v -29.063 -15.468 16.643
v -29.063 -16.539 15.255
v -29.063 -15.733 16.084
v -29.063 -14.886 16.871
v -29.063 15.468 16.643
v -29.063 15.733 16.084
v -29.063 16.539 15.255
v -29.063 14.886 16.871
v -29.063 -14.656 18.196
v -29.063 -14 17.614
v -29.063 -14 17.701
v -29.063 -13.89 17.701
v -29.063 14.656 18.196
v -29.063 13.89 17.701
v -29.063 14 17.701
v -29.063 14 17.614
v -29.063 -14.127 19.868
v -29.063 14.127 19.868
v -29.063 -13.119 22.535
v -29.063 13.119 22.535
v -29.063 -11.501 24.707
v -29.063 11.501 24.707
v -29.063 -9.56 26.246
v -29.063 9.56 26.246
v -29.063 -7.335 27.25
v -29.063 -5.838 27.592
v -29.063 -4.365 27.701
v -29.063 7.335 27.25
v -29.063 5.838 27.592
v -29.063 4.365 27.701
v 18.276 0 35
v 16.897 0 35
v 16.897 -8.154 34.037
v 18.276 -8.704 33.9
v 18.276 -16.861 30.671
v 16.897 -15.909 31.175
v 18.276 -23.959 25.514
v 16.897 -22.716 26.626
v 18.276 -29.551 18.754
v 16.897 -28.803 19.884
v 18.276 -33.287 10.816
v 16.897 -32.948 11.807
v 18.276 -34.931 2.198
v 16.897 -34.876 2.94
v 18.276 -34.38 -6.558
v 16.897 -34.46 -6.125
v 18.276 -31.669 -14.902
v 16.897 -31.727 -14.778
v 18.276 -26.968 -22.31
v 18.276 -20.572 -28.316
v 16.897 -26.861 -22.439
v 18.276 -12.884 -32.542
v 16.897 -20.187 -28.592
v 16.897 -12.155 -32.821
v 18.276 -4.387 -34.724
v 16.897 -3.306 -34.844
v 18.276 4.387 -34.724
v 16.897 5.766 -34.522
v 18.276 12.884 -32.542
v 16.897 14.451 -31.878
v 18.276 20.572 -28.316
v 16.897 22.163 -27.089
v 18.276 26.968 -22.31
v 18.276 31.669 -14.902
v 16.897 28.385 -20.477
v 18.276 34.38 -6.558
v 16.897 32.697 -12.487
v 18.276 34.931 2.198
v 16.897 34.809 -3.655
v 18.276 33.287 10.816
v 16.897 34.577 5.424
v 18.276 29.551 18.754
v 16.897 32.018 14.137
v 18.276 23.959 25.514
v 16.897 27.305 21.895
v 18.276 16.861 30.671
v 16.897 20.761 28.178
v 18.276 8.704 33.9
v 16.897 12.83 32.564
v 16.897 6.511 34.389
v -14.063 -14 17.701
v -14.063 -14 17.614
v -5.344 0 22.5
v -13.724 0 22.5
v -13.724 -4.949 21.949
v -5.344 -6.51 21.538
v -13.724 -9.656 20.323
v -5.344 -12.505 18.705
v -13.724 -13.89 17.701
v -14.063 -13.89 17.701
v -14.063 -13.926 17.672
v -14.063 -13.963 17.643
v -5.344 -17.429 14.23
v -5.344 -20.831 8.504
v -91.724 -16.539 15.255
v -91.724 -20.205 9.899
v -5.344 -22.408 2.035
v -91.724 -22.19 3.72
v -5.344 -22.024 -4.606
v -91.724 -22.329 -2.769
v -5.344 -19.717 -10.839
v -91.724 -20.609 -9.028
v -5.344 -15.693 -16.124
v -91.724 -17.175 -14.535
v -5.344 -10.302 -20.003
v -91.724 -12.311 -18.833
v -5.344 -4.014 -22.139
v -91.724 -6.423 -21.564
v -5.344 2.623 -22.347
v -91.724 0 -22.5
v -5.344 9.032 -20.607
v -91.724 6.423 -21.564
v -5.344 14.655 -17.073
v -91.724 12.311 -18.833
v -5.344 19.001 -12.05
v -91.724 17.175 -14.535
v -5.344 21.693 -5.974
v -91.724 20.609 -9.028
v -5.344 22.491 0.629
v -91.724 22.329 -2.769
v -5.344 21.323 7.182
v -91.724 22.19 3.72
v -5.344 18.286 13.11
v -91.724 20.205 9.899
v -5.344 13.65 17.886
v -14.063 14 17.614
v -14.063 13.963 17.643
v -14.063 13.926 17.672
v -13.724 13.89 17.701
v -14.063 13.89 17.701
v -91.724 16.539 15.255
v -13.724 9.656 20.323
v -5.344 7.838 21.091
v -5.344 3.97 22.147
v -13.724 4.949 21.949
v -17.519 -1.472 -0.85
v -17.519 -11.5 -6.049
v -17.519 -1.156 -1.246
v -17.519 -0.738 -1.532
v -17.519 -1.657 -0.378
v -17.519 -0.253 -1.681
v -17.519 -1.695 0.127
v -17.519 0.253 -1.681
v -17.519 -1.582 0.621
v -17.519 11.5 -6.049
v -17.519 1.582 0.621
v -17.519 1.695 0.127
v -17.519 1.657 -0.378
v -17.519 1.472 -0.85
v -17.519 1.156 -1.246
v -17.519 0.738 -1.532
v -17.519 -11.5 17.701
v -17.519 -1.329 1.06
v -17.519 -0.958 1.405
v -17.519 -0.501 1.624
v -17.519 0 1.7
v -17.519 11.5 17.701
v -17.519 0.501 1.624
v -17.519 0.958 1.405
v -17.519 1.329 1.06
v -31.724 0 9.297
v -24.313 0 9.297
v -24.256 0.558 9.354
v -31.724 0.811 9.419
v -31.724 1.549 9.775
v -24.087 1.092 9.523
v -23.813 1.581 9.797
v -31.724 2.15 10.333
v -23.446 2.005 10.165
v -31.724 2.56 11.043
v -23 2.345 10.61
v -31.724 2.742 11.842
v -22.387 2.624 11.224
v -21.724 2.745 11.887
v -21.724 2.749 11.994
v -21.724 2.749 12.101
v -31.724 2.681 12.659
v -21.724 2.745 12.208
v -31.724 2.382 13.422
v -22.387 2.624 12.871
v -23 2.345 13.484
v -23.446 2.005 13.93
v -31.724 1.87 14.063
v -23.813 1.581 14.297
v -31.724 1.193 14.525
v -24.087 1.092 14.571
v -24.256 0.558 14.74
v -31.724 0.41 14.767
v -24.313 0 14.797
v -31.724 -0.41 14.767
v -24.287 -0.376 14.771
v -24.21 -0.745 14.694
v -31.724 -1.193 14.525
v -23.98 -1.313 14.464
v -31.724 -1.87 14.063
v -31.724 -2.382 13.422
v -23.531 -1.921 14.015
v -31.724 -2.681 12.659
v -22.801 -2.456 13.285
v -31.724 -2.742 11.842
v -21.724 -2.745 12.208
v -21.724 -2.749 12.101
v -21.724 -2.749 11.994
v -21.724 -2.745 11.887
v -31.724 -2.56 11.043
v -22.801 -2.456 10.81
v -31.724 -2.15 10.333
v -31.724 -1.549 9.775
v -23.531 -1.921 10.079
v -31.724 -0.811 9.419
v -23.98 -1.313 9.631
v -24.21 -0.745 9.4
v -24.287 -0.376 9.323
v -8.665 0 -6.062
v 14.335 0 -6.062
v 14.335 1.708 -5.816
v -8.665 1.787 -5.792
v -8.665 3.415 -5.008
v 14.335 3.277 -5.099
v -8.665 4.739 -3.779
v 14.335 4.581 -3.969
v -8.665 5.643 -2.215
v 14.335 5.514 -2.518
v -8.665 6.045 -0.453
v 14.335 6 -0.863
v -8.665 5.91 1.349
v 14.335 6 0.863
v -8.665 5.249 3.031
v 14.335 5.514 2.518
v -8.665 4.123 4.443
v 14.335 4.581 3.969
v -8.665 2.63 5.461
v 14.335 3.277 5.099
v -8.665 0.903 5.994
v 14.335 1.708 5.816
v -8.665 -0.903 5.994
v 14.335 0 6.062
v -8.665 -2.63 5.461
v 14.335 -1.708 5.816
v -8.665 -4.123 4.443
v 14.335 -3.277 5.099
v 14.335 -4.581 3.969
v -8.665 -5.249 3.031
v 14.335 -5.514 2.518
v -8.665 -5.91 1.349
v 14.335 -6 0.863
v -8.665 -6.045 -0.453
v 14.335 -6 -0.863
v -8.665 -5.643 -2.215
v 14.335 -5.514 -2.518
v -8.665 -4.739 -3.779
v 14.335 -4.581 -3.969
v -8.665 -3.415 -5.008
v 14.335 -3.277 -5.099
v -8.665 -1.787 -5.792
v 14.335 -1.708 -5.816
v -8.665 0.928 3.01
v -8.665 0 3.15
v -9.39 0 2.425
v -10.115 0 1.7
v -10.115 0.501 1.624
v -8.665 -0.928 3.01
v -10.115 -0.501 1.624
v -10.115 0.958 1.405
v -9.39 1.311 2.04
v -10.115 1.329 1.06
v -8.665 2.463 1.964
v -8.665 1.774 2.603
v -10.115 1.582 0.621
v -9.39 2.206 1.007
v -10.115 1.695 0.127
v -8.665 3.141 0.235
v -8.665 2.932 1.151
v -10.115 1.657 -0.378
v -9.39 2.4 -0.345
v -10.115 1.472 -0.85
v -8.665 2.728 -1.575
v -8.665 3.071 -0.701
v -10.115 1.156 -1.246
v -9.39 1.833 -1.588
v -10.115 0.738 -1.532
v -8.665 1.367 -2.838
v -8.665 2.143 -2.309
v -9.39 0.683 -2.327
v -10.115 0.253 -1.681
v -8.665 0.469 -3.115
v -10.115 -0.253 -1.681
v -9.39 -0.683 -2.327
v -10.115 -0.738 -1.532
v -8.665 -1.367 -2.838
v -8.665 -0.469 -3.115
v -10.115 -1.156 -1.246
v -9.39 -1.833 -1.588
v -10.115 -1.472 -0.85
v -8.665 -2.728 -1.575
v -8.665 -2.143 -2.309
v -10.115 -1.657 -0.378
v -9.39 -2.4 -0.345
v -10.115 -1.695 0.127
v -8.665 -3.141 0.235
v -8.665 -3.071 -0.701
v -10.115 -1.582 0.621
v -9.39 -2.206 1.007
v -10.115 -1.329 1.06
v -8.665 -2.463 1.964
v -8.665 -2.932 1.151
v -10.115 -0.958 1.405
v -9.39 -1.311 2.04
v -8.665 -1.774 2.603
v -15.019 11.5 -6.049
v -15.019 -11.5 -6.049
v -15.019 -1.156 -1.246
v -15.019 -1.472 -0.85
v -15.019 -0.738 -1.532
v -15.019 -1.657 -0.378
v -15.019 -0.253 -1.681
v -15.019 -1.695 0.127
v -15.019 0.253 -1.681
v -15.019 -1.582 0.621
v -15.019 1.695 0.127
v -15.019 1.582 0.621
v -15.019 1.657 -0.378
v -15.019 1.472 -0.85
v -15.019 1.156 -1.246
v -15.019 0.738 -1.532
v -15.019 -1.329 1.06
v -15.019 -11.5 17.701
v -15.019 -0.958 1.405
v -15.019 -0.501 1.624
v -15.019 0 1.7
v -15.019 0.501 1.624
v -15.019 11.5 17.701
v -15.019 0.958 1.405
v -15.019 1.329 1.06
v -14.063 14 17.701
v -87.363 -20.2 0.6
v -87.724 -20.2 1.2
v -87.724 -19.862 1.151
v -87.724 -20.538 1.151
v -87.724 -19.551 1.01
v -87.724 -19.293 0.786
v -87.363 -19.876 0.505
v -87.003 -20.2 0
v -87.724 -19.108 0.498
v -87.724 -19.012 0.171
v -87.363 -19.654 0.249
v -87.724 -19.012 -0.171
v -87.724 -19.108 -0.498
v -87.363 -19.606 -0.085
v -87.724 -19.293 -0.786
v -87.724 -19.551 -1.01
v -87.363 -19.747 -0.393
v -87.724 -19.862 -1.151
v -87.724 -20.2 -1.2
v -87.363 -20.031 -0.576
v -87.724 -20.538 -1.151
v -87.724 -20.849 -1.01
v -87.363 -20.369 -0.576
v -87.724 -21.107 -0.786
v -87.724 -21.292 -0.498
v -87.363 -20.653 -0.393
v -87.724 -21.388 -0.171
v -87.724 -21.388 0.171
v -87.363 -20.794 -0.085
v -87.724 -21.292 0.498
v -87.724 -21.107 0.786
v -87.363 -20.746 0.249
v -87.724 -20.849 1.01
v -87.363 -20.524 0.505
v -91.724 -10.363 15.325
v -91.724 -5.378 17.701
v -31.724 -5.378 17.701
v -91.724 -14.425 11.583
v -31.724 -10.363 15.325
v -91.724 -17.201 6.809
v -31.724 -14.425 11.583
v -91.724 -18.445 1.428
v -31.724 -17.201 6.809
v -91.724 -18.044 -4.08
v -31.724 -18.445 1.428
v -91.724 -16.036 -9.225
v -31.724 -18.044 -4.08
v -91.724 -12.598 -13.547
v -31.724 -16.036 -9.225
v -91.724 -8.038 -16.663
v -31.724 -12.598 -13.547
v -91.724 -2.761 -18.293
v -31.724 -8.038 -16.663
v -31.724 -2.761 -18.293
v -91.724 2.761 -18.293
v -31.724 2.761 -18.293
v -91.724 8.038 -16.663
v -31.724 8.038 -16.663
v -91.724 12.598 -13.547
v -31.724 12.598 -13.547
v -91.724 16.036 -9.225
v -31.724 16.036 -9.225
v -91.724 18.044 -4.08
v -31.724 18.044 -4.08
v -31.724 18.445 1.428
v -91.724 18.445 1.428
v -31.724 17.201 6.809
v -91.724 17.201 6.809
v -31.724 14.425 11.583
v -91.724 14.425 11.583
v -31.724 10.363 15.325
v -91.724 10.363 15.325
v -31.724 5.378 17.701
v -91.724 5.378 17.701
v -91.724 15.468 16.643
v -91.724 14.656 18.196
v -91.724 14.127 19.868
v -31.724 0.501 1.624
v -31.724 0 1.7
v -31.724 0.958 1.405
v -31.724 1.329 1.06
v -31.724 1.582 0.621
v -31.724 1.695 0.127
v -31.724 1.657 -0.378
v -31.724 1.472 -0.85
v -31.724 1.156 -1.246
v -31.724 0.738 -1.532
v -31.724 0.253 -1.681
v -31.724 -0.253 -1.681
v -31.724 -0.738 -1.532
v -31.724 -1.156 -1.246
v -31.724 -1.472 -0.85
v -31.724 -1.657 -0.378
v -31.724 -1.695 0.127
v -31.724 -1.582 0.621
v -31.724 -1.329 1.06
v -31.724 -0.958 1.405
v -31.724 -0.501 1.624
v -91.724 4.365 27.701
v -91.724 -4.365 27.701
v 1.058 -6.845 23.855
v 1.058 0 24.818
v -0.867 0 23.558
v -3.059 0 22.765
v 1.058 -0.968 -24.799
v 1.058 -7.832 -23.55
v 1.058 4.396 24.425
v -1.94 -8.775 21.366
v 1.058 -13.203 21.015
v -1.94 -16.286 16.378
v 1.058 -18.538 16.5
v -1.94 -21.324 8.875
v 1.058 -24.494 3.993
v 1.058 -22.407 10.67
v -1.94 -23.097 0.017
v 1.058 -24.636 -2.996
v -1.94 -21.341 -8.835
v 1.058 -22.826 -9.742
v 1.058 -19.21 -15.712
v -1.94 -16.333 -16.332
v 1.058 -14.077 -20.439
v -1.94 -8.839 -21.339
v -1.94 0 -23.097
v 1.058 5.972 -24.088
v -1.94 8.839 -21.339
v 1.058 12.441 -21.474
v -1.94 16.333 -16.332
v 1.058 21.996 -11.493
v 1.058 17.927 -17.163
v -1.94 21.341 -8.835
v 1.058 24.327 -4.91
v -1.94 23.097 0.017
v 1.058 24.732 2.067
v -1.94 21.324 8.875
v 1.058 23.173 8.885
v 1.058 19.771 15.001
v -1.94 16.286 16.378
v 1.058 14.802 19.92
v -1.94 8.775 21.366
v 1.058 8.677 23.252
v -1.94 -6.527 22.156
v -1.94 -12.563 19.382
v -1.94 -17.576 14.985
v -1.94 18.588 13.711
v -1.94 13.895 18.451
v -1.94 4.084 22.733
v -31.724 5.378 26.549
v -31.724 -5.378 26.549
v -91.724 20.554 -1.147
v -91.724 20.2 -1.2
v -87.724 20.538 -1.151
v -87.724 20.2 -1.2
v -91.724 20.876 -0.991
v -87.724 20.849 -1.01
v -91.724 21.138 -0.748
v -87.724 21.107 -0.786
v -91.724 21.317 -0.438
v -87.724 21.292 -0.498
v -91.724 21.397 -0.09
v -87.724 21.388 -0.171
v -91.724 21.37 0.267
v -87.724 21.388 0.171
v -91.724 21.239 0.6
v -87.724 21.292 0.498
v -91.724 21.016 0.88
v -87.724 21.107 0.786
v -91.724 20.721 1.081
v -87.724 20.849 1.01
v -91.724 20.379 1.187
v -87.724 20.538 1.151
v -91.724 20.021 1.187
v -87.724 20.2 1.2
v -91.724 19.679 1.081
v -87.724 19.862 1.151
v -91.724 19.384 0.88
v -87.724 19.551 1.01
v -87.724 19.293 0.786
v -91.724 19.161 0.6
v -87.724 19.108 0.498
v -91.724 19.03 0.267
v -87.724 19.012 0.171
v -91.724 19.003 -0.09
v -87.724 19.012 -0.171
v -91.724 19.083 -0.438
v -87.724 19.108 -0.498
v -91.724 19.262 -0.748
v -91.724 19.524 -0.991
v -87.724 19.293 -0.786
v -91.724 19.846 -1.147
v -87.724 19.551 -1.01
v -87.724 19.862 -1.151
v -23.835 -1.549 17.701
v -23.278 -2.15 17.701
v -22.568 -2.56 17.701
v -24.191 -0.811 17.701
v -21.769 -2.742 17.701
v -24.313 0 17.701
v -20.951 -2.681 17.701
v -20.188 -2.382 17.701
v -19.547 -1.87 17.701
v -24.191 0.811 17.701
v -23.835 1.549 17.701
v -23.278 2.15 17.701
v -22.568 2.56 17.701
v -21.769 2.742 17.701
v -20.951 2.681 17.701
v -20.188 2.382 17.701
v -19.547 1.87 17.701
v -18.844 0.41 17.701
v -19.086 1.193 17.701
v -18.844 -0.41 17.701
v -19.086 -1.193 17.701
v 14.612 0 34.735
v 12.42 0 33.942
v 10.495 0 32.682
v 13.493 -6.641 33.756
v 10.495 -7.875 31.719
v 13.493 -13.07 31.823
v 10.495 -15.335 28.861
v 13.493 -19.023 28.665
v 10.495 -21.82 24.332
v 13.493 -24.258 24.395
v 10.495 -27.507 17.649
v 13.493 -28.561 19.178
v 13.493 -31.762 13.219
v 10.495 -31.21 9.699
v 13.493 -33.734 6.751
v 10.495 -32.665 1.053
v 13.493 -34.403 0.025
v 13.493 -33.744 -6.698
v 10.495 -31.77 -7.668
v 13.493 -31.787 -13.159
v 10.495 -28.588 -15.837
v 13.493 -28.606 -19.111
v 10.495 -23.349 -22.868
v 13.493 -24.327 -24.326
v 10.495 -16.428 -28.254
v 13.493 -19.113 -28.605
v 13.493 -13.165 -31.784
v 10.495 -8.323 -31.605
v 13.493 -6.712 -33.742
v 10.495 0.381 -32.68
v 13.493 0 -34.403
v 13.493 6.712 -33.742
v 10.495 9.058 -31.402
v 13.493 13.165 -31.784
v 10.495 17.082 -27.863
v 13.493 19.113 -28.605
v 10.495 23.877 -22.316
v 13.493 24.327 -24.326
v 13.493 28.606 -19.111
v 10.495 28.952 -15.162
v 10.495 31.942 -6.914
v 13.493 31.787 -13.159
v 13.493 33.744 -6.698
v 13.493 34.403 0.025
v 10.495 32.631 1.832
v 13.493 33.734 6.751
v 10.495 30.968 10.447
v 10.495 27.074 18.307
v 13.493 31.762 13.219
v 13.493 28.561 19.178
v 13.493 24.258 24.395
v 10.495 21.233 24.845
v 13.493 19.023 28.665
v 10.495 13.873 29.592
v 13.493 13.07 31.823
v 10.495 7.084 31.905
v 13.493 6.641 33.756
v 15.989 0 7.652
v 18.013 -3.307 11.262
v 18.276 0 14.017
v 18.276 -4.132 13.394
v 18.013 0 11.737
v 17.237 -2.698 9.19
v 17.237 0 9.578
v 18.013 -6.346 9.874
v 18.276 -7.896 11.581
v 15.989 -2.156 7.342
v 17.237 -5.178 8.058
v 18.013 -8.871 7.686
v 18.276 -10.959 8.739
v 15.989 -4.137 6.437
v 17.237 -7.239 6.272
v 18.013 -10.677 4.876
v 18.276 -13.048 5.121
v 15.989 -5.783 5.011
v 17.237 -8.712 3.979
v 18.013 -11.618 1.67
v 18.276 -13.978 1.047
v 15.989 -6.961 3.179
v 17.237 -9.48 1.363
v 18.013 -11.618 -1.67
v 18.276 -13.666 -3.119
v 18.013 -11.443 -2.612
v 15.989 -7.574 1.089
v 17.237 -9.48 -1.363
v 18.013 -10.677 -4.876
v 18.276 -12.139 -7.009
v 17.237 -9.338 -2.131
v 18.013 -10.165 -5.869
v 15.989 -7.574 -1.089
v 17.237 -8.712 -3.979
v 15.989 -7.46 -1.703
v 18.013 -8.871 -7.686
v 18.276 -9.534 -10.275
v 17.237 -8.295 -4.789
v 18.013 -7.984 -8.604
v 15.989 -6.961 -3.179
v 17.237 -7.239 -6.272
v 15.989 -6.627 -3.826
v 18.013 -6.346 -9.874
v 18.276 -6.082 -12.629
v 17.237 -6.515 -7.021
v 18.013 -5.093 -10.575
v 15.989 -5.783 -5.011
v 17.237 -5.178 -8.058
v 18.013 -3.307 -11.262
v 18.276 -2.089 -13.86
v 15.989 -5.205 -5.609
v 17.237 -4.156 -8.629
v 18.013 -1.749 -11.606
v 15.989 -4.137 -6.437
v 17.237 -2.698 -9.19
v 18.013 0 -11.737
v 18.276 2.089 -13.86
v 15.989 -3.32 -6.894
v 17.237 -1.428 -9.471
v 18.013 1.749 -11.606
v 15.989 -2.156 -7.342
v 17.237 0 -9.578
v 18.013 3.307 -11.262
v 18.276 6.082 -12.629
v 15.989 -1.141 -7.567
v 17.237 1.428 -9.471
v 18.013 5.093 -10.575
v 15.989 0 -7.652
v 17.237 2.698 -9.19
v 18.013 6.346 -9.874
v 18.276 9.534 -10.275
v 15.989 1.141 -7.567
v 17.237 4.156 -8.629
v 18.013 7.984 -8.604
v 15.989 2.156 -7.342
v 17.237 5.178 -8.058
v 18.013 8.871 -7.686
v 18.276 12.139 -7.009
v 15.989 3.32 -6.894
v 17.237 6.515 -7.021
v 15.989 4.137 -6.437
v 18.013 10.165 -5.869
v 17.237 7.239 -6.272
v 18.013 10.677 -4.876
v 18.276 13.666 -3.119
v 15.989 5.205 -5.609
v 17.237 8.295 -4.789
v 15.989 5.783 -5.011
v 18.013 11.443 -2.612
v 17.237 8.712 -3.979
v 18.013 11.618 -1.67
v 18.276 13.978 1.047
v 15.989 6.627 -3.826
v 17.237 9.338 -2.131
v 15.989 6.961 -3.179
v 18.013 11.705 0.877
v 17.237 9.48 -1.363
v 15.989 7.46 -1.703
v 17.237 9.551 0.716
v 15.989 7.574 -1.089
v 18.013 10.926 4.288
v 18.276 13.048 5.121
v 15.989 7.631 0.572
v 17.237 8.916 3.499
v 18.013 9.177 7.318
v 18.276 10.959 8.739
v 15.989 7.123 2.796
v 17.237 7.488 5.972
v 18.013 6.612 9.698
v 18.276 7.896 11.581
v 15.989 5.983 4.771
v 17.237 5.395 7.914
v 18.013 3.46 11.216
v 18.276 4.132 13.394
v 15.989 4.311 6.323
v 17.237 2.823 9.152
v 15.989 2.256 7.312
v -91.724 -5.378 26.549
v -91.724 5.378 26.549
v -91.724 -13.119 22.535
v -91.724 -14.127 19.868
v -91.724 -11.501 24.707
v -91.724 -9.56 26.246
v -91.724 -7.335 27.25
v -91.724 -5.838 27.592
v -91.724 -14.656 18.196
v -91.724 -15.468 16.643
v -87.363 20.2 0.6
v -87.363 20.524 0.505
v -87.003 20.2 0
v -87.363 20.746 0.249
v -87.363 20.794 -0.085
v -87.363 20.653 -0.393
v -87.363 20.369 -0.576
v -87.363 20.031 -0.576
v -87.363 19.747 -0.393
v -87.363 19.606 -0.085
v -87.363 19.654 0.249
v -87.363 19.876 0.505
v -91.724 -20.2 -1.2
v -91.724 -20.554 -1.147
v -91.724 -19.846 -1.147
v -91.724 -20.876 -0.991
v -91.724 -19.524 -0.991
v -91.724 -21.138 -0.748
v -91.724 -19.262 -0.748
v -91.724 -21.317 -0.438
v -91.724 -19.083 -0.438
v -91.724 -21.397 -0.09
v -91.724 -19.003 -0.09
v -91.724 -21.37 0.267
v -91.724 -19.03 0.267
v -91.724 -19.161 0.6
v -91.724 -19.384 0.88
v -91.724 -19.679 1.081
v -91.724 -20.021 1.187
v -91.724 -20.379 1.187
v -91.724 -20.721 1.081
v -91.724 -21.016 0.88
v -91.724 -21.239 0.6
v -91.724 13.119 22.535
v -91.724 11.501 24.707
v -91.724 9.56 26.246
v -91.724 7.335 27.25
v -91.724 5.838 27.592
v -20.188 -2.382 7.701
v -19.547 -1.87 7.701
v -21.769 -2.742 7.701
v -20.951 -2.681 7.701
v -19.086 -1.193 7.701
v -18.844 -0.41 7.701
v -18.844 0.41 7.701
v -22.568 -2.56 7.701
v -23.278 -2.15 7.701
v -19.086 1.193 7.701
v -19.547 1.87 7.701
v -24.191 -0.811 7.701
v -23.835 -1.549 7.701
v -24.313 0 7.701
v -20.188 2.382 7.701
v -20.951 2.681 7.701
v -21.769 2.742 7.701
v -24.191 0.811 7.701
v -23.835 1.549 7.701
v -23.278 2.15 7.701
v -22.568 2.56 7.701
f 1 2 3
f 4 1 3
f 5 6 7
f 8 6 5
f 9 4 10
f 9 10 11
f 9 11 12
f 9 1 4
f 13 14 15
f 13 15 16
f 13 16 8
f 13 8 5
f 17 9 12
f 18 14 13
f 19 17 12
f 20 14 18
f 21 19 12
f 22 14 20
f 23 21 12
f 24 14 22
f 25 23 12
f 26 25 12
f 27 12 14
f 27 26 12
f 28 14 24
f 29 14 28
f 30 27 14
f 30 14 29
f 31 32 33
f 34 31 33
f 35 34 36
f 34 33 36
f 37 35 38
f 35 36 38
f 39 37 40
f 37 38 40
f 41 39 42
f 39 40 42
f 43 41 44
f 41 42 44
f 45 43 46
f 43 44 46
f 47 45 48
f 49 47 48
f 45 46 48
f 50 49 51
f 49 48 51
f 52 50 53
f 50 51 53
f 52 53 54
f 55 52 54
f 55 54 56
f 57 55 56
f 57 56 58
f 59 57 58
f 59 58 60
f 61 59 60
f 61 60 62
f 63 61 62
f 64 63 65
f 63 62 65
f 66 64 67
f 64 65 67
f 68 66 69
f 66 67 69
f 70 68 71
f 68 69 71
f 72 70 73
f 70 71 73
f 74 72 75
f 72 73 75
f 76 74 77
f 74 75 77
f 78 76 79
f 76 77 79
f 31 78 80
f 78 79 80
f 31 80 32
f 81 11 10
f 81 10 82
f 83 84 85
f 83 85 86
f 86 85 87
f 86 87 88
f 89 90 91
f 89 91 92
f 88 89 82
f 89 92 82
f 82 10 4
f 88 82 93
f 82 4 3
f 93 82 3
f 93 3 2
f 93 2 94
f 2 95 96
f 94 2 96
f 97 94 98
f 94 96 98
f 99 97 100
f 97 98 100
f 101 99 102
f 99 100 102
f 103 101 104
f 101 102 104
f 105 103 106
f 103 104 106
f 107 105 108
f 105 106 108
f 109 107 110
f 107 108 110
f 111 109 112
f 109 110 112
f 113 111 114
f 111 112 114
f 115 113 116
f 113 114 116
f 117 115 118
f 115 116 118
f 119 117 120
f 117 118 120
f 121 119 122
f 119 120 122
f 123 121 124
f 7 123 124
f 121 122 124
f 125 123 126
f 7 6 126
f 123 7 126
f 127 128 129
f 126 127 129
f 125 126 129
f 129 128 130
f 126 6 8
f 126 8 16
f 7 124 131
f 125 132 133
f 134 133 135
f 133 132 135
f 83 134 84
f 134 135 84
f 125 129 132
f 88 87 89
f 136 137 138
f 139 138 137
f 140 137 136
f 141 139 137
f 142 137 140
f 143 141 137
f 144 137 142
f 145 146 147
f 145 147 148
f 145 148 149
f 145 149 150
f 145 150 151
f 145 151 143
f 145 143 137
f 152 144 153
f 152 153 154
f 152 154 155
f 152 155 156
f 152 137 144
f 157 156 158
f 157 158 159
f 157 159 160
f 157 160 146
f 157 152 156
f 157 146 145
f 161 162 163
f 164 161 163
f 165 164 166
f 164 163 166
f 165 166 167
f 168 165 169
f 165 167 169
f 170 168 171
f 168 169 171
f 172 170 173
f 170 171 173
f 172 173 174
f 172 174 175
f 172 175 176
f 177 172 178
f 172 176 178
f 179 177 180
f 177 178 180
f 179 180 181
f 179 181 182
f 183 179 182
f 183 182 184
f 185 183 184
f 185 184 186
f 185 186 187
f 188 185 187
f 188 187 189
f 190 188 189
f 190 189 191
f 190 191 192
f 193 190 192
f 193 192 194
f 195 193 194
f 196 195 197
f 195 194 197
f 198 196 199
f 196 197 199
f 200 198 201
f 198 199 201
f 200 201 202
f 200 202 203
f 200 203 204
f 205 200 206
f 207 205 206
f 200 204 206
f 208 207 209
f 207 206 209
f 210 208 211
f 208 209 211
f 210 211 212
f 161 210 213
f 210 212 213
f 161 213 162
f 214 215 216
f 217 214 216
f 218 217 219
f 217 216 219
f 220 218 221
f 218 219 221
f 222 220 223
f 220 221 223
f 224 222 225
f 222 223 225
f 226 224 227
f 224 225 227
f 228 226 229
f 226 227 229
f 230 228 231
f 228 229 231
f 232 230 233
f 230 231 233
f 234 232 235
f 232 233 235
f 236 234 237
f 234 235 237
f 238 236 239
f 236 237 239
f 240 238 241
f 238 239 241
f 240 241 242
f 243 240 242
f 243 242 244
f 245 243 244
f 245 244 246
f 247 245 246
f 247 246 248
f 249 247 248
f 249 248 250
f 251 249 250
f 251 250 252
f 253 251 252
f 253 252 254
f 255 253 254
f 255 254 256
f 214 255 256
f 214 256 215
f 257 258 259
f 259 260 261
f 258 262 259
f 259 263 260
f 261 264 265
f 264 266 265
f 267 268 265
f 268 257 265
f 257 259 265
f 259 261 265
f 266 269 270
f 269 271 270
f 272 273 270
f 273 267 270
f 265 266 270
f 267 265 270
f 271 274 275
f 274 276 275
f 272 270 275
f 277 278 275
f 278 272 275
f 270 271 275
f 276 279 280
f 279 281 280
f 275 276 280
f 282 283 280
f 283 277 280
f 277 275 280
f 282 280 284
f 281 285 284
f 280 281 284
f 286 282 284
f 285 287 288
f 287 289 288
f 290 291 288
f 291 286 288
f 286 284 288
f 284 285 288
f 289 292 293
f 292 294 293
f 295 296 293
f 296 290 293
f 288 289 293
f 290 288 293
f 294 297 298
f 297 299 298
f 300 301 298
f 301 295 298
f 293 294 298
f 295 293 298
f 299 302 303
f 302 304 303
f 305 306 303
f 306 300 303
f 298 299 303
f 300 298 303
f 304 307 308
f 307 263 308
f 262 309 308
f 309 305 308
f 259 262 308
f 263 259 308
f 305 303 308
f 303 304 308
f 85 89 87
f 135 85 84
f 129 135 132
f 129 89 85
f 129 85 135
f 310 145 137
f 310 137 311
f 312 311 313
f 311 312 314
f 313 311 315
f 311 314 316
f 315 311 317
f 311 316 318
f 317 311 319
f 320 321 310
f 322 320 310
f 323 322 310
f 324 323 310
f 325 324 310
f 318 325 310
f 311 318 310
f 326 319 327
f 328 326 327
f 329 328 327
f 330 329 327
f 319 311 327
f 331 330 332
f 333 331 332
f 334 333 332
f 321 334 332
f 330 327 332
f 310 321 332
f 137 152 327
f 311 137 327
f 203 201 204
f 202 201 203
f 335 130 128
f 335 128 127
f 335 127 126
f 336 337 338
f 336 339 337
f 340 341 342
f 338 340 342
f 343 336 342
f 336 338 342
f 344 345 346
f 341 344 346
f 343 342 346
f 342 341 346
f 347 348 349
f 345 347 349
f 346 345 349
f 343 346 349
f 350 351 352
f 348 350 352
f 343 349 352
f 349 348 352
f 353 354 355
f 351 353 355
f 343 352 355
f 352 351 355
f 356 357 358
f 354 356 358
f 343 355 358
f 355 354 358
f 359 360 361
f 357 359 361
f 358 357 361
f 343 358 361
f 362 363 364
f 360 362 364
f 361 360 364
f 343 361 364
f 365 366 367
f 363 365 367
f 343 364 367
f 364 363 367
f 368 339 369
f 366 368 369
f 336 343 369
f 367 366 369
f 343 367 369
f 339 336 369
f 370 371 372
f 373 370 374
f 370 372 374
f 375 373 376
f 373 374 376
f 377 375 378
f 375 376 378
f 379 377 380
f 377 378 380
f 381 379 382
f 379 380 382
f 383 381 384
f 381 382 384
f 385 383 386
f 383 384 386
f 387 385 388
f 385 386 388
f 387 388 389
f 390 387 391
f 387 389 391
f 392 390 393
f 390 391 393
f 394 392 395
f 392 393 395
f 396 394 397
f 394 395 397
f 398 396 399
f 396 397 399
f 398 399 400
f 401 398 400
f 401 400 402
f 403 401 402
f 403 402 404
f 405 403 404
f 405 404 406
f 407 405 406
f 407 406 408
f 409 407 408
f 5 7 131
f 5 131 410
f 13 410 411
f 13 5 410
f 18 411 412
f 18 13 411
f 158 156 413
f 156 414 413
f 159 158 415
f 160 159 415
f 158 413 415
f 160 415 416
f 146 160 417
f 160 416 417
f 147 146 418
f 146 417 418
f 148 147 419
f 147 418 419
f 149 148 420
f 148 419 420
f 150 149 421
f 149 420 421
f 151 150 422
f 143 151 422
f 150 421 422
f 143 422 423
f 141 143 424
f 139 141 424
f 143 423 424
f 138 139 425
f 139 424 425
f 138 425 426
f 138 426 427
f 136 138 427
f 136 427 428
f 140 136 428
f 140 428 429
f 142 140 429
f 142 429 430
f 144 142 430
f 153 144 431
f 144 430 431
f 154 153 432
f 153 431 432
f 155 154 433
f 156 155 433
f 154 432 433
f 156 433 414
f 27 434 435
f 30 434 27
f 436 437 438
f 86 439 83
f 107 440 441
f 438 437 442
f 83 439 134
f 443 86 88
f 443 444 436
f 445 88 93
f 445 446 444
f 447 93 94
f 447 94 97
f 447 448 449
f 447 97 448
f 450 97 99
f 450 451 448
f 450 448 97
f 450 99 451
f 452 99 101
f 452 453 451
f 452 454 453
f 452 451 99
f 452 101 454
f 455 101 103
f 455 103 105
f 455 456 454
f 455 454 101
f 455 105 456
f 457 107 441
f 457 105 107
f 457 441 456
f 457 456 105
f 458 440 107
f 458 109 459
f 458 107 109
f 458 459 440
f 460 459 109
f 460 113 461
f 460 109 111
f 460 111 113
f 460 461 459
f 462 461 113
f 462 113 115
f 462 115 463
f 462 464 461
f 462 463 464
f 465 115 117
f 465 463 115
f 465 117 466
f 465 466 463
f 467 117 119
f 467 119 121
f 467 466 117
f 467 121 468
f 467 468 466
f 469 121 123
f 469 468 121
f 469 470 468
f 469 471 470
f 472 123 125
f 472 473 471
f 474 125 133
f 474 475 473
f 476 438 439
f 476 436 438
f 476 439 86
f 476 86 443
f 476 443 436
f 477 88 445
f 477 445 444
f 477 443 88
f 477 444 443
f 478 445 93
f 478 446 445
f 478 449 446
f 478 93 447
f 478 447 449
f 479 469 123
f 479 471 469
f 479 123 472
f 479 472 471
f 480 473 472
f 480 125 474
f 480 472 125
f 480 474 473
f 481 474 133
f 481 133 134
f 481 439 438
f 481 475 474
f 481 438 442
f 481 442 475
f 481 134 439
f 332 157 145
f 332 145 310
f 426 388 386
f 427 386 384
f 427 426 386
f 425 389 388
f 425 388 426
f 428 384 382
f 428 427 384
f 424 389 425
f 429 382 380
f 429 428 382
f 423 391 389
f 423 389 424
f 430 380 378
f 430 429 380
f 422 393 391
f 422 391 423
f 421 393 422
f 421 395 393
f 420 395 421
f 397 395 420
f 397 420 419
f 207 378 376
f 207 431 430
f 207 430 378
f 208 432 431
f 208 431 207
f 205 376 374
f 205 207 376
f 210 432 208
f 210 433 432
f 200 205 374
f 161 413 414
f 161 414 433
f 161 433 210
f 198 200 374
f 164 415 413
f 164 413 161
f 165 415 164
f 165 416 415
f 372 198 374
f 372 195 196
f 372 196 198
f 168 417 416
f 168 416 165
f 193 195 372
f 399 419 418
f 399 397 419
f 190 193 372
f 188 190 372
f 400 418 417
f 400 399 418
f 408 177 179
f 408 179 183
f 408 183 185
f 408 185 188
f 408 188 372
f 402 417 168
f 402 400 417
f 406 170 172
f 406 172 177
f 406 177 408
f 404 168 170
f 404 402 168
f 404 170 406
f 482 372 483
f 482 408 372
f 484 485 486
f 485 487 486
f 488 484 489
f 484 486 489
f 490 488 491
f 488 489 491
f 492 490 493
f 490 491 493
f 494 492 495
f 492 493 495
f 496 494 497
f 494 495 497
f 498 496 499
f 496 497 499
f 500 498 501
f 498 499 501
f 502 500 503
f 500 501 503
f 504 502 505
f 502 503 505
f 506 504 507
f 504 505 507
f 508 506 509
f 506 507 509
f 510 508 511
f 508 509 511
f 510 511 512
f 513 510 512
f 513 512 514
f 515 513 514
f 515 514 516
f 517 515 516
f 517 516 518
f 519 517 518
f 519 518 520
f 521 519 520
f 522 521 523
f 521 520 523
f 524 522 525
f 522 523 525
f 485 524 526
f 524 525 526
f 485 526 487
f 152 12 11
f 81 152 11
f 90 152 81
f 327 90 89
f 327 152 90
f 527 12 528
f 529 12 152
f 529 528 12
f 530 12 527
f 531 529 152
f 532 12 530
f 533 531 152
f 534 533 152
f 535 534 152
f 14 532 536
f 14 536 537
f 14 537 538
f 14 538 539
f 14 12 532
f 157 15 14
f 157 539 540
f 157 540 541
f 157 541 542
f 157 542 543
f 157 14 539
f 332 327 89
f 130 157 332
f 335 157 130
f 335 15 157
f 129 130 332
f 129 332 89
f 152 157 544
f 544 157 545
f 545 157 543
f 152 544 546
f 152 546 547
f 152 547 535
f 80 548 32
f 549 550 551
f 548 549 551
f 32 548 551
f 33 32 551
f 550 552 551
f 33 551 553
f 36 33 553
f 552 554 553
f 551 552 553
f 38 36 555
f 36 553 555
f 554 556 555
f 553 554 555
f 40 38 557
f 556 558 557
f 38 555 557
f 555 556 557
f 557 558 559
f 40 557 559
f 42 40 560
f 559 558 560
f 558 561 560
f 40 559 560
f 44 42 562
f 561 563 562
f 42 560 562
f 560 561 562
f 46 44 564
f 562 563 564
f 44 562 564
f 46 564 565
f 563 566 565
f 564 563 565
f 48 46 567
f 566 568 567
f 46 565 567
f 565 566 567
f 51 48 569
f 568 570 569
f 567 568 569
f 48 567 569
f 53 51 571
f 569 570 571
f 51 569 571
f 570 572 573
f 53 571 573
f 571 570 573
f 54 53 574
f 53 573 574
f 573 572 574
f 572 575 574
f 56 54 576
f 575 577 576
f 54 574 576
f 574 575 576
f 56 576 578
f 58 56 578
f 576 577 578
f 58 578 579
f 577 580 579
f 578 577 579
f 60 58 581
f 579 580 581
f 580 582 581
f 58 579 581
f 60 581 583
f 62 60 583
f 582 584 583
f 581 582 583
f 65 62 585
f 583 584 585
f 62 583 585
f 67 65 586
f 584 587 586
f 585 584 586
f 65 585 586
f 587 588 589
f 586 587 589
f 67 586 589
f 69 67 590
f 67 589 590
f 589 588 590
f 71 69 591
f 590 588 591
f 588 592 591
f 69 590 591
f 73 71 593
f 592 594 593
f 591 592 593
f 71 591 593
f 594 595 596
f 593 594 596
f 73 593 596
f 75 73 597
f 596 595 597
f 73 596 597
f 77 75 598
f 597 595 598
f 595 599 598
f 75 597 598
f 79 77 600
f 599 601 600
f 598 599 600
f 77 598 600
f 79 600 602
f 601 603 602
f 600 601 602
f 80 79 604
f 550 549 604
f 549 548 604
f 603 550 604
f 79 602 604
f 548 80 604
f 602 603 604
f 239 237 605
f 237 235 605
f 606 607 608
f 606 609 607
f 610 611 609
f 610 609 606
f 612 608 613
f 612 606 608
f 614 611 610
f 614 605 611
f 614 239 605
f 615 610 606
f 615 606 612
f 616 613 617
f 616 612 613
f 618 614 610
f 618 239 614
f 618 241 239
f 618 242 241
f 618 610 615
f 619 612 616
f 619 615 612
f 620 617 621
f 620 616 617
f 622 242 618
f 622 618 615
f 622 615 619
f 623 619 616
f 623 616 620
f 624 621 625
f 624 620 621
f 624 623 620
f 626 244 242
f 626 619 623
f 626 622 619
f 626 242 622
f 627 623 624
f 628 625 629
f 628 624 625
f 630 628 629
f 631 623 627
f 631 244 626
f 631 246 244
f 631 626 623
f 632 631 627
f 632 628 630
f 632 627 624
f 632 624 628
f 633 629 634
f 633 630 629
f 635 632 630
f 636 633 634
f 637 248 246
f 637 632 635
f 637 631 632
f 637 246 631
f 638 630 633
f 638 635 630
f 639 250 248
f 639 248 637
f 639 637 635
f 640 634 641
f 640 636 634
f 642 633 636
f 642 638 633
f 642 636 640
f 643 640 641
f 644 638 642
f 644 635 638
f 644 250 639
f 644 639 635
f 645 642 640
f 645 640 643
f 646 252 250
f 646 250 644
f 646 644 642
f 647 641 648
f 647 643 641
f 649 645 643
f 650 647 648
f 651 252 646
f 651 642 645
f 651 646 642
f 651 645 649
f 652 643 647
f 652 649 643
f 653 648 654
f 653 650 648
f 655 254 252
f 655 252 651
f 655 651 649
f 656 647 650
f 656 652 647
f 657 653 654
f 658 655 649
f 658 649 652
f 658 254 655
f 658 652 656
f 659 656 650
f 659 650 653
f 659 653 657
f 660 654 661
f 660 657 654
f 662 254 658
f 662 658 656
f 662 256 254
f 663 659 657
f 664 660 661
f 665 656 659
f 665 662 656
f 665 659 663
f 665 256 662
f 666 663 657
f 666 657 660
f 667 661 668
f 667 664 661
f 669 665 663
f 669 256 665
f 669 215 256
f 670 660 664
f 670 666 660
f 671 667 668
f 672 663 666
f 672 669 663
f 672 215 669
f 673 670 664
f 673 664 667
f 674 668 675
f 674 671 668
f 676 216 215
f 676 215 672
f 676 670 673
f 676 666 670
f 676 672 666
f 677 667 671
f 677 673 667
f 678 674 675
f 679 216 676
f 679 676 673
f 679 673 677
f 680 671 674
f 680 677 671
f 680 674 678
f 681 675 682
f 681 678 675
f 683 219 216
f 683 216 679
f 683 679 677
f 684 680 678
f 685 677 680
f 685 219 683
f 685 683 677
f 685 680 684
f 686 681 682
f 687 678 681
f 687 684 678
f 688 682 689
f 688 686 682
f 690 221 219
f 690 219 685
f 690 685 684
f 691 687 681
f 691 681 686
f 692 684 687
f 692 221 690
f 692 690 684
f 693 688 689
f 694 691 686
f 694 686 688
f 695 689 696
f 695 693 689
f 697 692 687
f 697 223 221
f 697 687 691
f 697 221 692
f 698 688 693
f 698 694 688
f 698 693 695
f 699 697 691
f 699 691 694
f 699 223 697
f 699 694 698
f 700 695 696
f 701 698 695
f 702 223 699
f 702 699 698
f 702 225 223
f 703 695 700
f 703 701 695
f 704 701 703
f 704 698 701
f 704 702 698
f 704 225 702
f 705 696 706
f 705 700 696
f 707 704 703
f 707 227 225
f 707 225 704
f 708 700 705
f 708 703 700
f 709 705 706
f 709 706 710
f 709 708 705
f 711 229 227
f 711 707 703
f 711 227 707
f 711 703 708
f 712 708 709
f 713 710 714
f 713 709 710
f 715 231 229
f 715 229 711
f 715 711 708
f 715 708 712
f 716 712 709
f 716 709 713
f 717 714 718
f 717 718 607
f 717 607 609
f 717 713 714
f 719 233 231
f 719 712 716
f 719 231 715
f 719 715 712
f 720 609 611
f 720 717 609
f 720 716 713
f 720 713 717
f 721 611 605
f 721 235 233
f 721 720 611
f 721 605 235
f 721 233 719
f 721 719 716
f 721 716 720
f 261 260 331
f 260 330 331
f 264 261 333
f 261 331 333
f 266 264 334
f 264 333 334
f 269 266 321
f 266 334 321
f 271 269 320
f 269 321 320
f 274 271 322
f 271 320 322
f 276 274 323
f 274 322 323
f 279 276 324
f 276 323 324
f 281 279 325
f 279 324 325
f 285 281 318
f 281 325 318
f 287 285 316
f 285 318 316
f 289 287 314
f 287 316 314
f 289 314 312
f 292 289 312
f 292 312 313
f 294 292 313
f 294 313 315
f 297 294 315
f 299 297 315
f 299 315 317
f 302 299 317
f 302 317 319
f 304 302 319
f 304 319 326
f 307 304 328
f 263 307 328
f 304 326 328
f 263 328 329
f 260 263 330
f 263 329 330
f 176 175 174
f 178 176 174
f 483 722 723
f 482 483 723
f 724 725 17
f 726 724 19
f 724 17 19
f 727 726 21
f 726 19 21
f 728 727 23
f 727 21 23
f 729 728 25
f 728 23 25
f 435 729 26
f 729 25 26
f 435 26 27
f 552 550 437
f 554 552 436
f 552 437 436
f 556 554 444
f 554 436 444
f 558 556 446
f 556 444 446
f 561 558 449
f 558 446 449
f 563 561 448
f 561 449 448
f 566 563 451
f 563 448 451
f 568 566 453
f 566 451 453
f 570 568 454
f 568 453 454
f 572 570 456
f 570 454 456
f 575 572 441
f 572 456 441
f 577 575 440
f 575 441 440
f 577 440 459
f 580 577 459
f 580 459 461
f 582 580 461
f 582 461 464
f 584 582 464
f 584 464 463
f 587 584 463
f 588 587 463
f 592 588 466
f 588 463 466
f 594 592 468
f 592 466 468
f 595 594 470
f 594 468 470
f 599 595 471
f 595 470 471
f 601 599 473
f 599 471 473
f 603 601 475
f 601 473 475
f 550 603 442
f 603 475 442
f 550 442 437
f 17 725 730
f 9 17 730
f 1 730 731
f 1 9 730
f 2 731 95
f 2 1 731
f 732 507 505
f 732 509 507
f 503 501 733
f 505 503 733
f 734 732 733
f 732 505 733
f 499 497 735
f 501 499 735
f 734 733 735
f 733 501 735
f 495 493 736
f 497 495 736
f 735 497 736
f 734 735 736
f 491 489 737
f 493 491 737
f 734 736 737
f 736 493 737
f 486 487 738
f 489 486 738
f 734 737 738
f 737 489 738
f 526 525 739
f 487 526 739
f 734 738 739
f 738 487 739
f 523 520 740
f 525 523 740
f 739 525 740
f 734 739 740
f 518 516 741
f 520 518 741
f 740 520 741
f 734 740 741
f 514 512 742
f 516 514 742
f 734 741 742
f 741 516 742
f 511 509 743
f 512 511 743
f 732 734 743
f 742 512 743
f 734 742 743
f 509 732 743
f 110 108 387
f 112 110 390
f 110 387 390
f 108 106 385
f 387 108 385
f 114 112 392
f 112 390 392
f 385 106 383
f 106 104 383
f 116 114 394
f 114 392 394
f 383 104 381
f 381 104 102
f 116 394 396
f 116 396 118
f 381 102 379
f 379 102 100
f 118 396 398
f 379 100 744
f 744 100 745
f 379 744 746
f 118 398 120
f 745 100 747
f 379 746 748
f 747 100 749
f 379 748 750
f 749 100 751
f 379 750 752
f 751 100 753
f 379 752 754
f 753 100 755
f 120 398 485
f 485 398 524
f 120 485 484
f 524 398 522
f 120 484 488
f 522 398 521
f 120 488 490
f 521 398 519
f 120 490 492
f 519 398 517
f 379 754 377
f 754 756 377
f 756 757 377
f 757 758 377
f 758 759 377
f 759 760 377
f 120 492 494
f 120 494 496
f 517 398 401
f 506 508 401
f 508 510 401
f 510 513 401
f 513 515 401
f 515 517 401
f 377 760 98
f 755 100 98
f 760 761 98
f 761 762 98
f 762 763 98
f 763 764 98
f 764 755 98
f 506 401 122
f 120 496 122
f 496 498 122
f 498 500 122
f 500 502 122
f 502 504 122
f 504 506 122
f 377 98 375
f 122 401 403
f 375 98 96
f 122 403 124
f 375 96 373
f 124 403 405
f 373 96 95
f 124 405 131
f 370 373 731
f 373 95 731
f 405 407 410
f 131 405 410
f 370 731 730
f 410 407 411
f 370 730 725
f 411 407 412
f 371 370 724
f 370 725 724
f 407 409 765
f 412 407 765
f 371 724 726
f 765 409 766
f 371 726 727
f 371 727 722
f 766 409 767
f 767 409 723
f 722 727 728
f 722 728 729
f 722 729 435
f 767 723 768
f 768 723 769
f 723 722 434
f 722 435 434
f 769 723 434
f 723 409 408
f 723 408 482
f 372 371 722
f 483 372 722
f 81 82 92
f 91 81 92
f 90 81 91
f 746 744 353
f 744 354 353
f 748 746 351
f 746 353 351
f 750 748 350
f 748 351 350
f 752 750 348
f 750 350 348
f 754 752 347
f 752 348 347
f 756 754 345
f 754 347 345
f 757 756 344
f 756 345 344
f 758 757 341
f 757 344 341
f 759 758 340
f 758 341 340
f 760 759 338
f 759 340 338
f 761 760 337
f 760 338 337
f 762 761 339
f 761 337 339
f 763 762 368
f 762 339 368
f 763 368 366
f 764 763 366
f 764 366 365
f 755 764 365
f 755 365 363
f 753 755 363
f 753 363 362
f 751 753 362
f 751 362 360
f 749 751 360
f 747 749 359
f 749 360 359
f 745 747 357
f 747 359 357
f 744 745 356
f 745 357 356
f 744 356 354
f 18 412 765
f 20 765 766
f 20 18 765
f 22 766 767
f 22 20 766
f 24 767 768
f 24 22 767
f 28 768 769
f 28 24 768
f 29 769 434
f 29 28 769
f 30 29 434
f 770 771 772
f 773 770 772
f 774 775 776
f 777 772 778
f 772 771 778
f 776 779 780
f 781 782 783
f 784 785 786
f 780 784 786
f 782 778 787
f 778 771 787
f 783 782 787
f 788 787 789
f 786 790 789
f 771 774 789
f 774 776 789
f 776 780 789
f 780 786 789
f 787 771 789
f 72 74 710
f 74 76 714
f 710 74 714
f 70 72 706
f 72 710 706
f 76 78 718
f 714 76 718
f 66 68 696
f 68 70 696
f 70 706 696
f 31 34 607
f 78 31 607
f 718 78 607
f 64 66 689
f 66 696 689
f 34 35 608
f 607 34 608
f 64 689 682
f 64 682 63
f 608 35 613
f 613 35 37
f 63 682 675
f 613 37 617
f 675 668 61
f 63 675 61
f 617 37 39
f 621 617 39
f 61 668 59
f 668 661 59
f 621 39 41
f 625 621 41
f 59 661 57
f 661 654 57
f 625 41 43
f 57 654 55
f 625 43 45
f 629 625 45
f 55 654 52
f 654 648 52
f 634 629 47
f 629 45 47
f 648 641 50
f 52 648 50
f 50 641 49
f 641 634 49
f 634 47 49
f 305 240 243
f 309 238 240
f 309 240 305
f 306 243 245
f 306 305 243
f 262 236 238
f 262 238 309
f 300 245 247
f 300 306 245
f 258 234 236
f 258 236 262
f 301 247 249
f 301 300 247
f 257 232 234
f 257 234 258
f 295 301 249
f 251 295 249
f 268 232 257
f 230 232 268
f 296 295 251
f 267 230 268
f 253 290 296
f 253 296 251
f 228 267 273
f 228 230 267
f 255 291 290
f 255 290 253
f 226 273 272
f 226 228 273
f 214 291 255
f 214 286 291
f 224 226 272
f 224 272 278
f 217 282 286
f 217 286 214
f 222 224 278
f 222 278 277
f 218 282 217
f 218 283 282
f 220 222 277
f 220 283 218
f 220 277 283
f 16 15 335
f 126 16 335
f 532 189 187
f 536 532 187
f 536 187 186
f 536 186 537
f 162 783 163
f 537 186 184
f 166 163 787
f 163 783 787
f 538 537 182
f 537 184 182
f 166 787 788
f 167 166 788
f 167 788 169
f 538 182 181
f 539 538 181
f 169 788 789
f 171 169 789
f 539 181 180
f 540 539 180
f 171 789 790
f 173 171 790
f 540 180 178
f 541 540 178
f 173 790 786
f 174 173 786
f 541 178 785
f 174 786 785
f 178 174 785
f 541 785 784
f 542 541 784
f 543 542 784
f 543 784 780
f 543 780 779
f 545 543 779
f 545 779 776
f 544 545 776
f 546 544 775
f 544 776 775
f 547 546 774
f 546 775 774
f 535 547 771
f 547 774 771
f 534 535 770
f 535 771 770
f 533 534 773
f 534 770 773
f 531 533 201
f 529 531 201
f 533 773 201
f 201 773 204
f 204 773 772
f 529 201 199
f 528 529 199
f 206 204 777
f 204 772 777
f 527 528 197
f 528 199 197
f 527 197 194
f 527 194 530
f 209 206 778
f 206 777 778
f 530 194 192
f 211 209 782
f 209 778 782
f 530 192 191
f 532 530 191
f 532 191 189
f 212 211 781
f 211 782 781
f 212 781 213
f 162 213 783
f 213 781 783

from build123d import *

# Parameters (mm, degrees)
SCHIZZO3_W                             = 9.243109639
SCHIZZO3_H                             = 30.902871456
TAGLIO_ESTRUSIONE2_DEPTH               = 78
SCHIZZO4_W                             = 15
SCHIZZO4_H                             = 28
ESTRUSIONE_ESTRUSIONE1_DEPTH           = 12
FORO_PER_VITE_M4_2_D                   = 37
FORO_PER_VITE_M4_2_DEPTH               = 60
FORO_PER_VITE_M5_1_D                   = 5.5
FORO_PER_VITE_M5_1_DEPTH               = 10
FORO_PER_VITE_M5_2_D                   = 5.5
FORO_PER_VITE_M5_2_DEPTH               = 10
FORO_PER_VITE_M2_2_D                   = 2.4
FORO_PER_VITE_M2_2_DEPTH               = 4
FORO_PER_VITE_M2_2_TIP                 = 0.721032743
SCHIZZO28_W                            = 62.660258955
SCHIZZO28_H                            = 27.779148216
ESTRUSIONE_ESTRUSIONE7_DEPTH           = 10
SCHIZZO29_W                            = 8.847921359
SCHIZZO29_H                            = 10.755513732
TAGLIO_ESTRUSIONE5_DEPTH               = 60
RACCORDO20_R                           = 10
RACCORDO21_R                           = 10
RACCORDO22_R                           = 10
RACCORDO24_R                           = 10
RACCORDO25_R                           = 10
RACCORDO26_R                           = 10
RACCORDO27_R                           = 10
SCHIZZO30_R                            = 6.061580104
TAGLIO_ESTRUSIONE6_DEPTH               = 23
SCHIZZO31_W                            = 2.5
SCHIZZO31_H                            = 23
TAGLIO_ESTRUSIONE7_DEPTH               = 23.75
FORO_SVASATO_PER_VITE_M3_1_D           = 3.4
FORO_SVASATO_PER_VITE_M3_1_CSINK_D     = 6.3
FORO_SVASATO_PER_VITE_M3_1_CSINK_ANGLE = 90


with BuildPart() as part:
    # Schizzo2 → Rivoluzione2 (revolve)
    with BuildSketch(Plane(origin=(0, 0, 0), x_dir=(1, 0, 0), z_dir=(0, 1, 0)), mode=Mode.PRIVATE) as rivoluzione2_sk:
        Polygon((-91.723538337, 22.5), (-91.723538337, 0), (14.335392963, 0), (14.335392963, 6.061580104), (18.276461663, 6.061580104), (18.276461663, 35), (13.276461663, 35), (-1.723538337, 22.5), align=None)
    revolve(rivoluzione2_sk.sketch.rotate(Axis((-119.689698016, 0, 0), (1, 0, 0)), 180), axis=Axis((-119.689698016, 0, 0), (1, 0, 0)))

    # Schizzo3 → Taglio-Estrusione2 (cut)
    with BuildSketch(Plane.ZY.offset(91.723538337)):
        with Locations((22.322677132, 0)):
            Rectangle(SCHIZZO3_W, SCHIZZO3_H)
    extrude(amount=-TAGLIO_ESTRUSIONE2_DEPTH, mode=Mode.SUBTRACT)

    # Schizzo4 → Estrusione-Estrusione1 (add)
    with BuildSketch(Plane.XY.offset(17.701122312)):
        with Locations((-21.563279382, 0)):
            Rectangle(SCHIZZO4_W, SCHIZZO4_H)
    extrude(amount=-ESTRUSIONE_ESTRUSIONE1_DEPTH)

    # Foro per Vite M4-2
    with Locations(Plane.ZY.offset(91.723538337)):
        with Locations((0, 0)):
            Hole(FORO_PER_VITE_M4_2_D / 2, depth=FORO_PER_VITE_M4_2_DEPTH)

    # Foro per Vite M5-1
    with Locations(Plane.XY.offset(17.701122312)):
        with Locations((-21.563279382, 0)):
            Hole(FORO_PER_VITE_M5_1_D / 2, depth=FORO_PER_VITE_M5_1_DEPTH)

    # Foro per Vite M5-2
    with Locations(Plane.ZY.offset(31.723538337)):
        with Locations((12.047310847, 0)):
            Hole(FORO_PER_VITE_M5_2_D / 2, depth=FORO_PER_VITE_M5_2_DEPTH)

    # Foro per Vite M2-2
    with Locations(Plane.ZY.offset(91.723538337)):
        with Locations((0, 20.2), (0, -20.2)):
            Hole(FORO_PER_VITE_M2_2_D / 2, depth=FORO_PER_VITE_M2_2_DEPTH)
            with Locations((0, 0, -(FORO_PER_VITE_M2_2_DEPTH + FORO_PER_VITE_M2_2_TIP / 2))):  # 118° drill point
                Cone(0, FORO_PER_VITE_M2_2_D / 2, FORO_PER_VITE_M2_2_TIP, mode=Mode.SUBTRACT)

    # Schizzo28 → Estrusione-Estrusione7 (add)
    with BuildSketch(Plane.XY.offset(17.701122312)):
        with Locations((-60.39340886, 0)):
            Rectangle(SCHIZZO28_W, SCHIZZO28_H)
    extrude(amount=ESTRUSIONE_ESTRUSIONE7_DEPTH)

    # Schizzo29 → Taglio-Estrusione5 (cut)
    with BuildSketch(Plane.ZY.offset(91.723538337)):
        with Locations((22.125082992, 0)):
            Rectangle(SCHIZZO29_W, SCHIZZO29_H)
    extrude(amount=-TAGLIO_ESTRUSIONE5_DEPTH, mode=Mode.SUBTRACT)

    # Raccordo20
    # the kernel refuses this fillet: 10 mm, written as the material it takes off along each edge
    with BuildSketch(Plane(origin=(18.276461663, 0, 0), x_dir=(0, 0, 1), z_dir=(0, 1, 0))) as raccordo20_piece_1:
        with BuildLine():
            CenterArc((14.017040588, -10), RACCORDO20_R, 90, 52.706861747)
            Line((6.061580104, -3.9410687), (5.902470894, -3.819890074))
            ThreePointArc((5.902470894, -3.819890074), (5.861580104, -1.97053435), (5.861580104, 0))
            Line((5.861580104, 0), (6.061580104, 0.2))
            Line((6.061580104, 0.2), (14.017040588, 0.2))
            Line((14.017040588, 0.2), (14.017040588, 0))
        make_face()
    revolve(axis=Axis((18.276461663, 0, 0), (1, 0, 0)), mode=Mode.SUBTRACT)

    # Raccordo21
    raccordo21_edges = [part.edges().sort_by_distance(p)[0] for p in [
        (13.276461663, 0, -35),
    ]]
    fillet(raccordo21_edges, radius=RACCORDO21_R)

    # Raccordo22
    raccordo22_edges = [part.edges().sort_by_distance(p)[0] for p in [
        (-1.723538337, 0, -22.5),
    ]]
    fillet(raccordo22_edges, radius=RACCORDO22_R)

    # Raccordo24
    # the kernel refuses this fillet: 10 mm, written as the material it adds along each edge
    with BuildSketch(Plane(origin=(-29.063279382, 13.889574108, 17.701122312), x_dir=(0, 0.7347199128018105, -0.6783705843655811), z_dir=(-1, 0, 0))) as raccordo24_piece_1:
        with BuildLine():
            CenterArc((4.407269799, -9.967842465), RACCORDO24_R, 94.596163378, 42.687391022)
            Line((-2.939929329, -3.184136621), (0, 0))
            ThreePointArc((0, 0), (1.802974009, -0.072354454), (3.605948017, 0))
        make_face()
    extrude(amount=62.660258955)

    # Raccordo25
    raccordo25_edges = [part.edges().sort_by_distance(p)[0] for p in [
        (-60.393408859, 13.889574108, 27.701122312),
    ]]
    fillet(raccordo25_edges, radius=RACCORDO25_R)

    # Raccordo26
    # the kernel refuses this fillet: 10 mm, written as the material it adds along each edge
    with BuildSketch(Plane(origin=(-29.063279382, -13.889574108, 17.701122312), x_dir=(0, -0.7347199128018104, -0.6783705843655813), z_dir=(-1, 0, 0))) as raccordo26_piece_1:
        with BuildLine():
            CenterArc((4.407269799, 9.967842465), RACCORDO26_R, 222.7164456, 42.687391022)
            Line((-2.939929329, 3.184136621), (0, 0))
            ThreePointArc((0, 0), (1.802974009, 0.072354454), (3.605948017, 0))
        make_face()
    extrude(amount=62.660258955)

    # Raccordo27
    raccordo27_edges = [part.edges().sort_by_distance(p)[0] for p in [
        (-60.393408859, -13.889574108, 27.701122312),
    ]]
    fillet(raccordo27_edges, radius=RACCORDO27_R)

    # Schizzo30 → Taglio-Estrusione6 (cut)
    with BuildSketch(Plane(origin=(14.335392963, 0, 0), x_dir=(0, 0, -1), z_dir=(1, 0, 0))):
        Circle(SCHIZZO30_R)
    extrude(amount=-TAGLIO_ESTRUSIONE6_DEPTH, mode=Mode.SUBTRACT)

    # Schizzo31 → Taglio-Estrusione7 (cut)
    with BuildSketch(Plane.XY.offset(17.701122312)):
        with Locations((-16.268538337, 0)):
            Rectangle(SCHIZZO31_W, SCHIZZO31_H)
    extrude(amount=-TAGLIO_ESTRUSIONE7_DEPTH, mode=Mode.SUBTRACT)

    # Foro svasato per Vite M3-1 (through all)
    with Locations(Plane(origin=(-8.664607037, 0, 0), x_dir=(0, 0, -1), z_dir=(1, 0, 0))):
        with Locations((0, 0)):
            CounterSinkHole(FORO_SVASATO_PER_VITE_M3_1_D / 2, FORO_SVASATO_PER_VITE_M3_1_CSINK_D / 2, counter_sink_angle=FORO_SVASATO_PER_VITE_M3_1_CSINK_ANGLE)


solid = part.part
